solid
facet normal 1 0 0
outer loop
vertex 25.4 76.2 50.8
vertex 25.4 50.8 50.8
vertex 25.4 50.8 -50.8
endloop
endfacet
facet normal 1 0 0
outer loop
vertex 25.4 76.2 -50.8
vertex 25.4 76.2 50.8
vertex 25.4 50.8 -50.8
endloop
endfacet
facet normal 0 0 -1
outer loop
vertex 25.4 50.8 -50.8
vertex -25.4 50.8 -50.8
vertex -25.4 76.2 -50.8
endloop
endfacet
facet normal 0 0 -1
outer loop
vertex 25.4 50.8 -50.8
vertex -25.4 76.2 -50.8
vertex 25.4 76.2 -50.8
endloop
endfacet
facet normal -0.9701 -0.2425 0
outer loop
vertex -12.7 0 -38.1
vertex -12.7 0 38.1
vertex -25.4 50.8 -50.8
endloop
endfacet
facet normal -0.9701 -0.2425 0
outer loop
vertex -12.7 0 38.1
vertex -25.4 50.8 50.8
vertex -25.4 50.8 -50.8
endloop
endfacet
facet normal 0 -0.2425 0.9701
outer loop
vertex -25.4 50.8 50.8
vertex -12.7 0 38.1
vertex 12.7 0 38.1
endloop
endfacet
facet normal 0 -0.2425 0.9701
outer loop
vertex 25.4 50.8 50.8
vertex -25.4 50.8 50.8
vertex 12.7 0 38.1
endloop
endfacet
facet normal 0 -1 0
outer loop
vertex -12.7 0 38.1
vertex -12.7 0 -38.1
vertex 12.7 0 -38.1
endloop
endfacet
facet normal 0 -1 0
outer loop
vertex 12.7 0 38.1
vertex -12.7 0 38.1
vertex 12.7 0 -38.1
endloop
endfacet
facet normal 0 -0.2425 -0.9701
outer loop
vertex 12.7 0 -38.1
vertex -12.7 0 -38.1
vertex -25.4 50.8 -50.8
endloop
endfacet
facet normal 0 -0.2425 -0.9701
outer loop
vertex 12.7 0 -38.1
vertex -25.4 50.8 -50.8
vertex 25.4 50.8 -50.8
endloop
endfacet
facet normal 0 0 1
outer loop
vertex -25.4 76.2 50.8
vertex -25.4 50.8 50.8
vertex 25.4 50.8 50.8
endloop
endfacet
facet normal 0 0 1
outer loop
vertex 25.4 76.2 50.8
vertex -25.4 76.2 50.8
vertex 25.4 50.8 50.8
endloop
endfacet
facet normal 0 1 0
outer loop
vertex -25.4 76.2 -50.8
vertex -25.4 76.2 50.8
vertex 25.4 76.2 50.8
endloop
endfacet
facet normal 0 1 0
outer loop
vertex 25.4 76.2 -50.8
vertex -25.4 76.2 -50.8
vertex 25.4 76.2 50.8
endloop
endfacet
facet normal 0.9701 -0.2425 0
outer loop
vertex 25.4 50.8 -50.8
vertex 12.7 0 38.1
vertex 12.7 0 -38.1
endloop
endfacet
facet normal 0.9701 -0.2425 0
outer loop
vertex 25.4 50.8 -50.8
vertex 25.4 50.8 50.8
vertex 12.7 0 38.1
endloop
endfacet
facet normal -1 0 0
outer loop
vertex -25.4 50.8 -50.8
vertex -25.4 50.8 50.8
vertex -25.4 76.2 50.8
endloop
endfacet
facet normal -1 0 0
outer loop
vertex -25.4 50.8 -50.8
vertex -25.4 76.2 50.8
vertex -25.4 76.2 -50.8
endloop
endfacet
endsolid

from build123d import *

# Parameters (mm, degrees)
SKETCH1_W           = 50.8
SKETCH1_H           = 101.6
BOSS_EXTRUDE1_DEPTH = 76.2
CHAMFER1_SIZE       = 12.7
CHAMFER1_SIZE2      = 50.8
CHAMFER2_SIZE       = 12.7
CHAMFER2_SIZE2      = 50.8
CHAMFER3_SIZE       = 12.7
CHAMFER3_SIZE2      = 50.8
CHAMFER4_SIZE       = 12.7
CHAMFER4_SIZE2      = 50.8


with BuildPart() as part:
    # Sketch1 → Boss-Extrude1 (new body)
    with BuildSketch(Plane(origin=(0, 0, 0), x_dir=(1, 0, 0), z_dir=(0, 1, 0))):
        Rectangle(SKETCH1_W, SKETCH1_H)
    extrude(amount=BOSS_EXTRUDE1_DEPTH)

    # Chamfer1
    chamfer1_edges = [part.edges().sort_by_distance(p)[0] for p in [
        (25.4, 0, 0),
    ]]
    chamfer1_side = [part.faces().sort_by_distance(p)[0] for p in [
        (0, 0, 0),
    ]]
    chamfer(chamfer1_edges, length=CHAMFER1_SIZE, length2=CHAMFER1_SIZE2, reference=chamfer1_side[0])

    # Chamfer2
    chamfer2_edges = [part.edges().sort_by_distance(p)[0] for p in [
        (-25.4, 0, 0),
    ]]
    chamfer2_side = [part.faces().sort_by_distance(p)[0] for p in [
        (-6.35, 0, 0),
    ]]
    chamfer(chamfer2_edges, length=CHAMFER2_SIZE, length2=CHAMFER2_SIZE2, reference=chamfer2_side[0])

    # Chamfer3
    chamfer3_edges = [part.edges().sort_by_distance(p)[0] for p in [
        (0, 0, 50.8),
    ]]
    chamfer3_side = [part.faces().sort_by_distance(p)[0] for p in [
        (0, 0, 0),
    ]]
    chamfer(chamfer3_edges, length=CHAMFER3_SIZE, length2=CHAMFER3_SIZE2, reference=chamfer3_side[0])

    # Chamfer4
    chamfer4_edges = [part.edges().sort_by_distance(p)[0] for p in [
        (0, 0, -50.8),
    ]]
    chamfer4_side = [part.faces().sort_by_distance(p)[0] for p in [
        (0, 0, -6.35),
    ]]
    chamfer(chamfer4_edges, length=CHAMFER4_SIZE, length2=CHAMFER4_SIZE2, reference=chamfer4_side[0])


solid = part.part
